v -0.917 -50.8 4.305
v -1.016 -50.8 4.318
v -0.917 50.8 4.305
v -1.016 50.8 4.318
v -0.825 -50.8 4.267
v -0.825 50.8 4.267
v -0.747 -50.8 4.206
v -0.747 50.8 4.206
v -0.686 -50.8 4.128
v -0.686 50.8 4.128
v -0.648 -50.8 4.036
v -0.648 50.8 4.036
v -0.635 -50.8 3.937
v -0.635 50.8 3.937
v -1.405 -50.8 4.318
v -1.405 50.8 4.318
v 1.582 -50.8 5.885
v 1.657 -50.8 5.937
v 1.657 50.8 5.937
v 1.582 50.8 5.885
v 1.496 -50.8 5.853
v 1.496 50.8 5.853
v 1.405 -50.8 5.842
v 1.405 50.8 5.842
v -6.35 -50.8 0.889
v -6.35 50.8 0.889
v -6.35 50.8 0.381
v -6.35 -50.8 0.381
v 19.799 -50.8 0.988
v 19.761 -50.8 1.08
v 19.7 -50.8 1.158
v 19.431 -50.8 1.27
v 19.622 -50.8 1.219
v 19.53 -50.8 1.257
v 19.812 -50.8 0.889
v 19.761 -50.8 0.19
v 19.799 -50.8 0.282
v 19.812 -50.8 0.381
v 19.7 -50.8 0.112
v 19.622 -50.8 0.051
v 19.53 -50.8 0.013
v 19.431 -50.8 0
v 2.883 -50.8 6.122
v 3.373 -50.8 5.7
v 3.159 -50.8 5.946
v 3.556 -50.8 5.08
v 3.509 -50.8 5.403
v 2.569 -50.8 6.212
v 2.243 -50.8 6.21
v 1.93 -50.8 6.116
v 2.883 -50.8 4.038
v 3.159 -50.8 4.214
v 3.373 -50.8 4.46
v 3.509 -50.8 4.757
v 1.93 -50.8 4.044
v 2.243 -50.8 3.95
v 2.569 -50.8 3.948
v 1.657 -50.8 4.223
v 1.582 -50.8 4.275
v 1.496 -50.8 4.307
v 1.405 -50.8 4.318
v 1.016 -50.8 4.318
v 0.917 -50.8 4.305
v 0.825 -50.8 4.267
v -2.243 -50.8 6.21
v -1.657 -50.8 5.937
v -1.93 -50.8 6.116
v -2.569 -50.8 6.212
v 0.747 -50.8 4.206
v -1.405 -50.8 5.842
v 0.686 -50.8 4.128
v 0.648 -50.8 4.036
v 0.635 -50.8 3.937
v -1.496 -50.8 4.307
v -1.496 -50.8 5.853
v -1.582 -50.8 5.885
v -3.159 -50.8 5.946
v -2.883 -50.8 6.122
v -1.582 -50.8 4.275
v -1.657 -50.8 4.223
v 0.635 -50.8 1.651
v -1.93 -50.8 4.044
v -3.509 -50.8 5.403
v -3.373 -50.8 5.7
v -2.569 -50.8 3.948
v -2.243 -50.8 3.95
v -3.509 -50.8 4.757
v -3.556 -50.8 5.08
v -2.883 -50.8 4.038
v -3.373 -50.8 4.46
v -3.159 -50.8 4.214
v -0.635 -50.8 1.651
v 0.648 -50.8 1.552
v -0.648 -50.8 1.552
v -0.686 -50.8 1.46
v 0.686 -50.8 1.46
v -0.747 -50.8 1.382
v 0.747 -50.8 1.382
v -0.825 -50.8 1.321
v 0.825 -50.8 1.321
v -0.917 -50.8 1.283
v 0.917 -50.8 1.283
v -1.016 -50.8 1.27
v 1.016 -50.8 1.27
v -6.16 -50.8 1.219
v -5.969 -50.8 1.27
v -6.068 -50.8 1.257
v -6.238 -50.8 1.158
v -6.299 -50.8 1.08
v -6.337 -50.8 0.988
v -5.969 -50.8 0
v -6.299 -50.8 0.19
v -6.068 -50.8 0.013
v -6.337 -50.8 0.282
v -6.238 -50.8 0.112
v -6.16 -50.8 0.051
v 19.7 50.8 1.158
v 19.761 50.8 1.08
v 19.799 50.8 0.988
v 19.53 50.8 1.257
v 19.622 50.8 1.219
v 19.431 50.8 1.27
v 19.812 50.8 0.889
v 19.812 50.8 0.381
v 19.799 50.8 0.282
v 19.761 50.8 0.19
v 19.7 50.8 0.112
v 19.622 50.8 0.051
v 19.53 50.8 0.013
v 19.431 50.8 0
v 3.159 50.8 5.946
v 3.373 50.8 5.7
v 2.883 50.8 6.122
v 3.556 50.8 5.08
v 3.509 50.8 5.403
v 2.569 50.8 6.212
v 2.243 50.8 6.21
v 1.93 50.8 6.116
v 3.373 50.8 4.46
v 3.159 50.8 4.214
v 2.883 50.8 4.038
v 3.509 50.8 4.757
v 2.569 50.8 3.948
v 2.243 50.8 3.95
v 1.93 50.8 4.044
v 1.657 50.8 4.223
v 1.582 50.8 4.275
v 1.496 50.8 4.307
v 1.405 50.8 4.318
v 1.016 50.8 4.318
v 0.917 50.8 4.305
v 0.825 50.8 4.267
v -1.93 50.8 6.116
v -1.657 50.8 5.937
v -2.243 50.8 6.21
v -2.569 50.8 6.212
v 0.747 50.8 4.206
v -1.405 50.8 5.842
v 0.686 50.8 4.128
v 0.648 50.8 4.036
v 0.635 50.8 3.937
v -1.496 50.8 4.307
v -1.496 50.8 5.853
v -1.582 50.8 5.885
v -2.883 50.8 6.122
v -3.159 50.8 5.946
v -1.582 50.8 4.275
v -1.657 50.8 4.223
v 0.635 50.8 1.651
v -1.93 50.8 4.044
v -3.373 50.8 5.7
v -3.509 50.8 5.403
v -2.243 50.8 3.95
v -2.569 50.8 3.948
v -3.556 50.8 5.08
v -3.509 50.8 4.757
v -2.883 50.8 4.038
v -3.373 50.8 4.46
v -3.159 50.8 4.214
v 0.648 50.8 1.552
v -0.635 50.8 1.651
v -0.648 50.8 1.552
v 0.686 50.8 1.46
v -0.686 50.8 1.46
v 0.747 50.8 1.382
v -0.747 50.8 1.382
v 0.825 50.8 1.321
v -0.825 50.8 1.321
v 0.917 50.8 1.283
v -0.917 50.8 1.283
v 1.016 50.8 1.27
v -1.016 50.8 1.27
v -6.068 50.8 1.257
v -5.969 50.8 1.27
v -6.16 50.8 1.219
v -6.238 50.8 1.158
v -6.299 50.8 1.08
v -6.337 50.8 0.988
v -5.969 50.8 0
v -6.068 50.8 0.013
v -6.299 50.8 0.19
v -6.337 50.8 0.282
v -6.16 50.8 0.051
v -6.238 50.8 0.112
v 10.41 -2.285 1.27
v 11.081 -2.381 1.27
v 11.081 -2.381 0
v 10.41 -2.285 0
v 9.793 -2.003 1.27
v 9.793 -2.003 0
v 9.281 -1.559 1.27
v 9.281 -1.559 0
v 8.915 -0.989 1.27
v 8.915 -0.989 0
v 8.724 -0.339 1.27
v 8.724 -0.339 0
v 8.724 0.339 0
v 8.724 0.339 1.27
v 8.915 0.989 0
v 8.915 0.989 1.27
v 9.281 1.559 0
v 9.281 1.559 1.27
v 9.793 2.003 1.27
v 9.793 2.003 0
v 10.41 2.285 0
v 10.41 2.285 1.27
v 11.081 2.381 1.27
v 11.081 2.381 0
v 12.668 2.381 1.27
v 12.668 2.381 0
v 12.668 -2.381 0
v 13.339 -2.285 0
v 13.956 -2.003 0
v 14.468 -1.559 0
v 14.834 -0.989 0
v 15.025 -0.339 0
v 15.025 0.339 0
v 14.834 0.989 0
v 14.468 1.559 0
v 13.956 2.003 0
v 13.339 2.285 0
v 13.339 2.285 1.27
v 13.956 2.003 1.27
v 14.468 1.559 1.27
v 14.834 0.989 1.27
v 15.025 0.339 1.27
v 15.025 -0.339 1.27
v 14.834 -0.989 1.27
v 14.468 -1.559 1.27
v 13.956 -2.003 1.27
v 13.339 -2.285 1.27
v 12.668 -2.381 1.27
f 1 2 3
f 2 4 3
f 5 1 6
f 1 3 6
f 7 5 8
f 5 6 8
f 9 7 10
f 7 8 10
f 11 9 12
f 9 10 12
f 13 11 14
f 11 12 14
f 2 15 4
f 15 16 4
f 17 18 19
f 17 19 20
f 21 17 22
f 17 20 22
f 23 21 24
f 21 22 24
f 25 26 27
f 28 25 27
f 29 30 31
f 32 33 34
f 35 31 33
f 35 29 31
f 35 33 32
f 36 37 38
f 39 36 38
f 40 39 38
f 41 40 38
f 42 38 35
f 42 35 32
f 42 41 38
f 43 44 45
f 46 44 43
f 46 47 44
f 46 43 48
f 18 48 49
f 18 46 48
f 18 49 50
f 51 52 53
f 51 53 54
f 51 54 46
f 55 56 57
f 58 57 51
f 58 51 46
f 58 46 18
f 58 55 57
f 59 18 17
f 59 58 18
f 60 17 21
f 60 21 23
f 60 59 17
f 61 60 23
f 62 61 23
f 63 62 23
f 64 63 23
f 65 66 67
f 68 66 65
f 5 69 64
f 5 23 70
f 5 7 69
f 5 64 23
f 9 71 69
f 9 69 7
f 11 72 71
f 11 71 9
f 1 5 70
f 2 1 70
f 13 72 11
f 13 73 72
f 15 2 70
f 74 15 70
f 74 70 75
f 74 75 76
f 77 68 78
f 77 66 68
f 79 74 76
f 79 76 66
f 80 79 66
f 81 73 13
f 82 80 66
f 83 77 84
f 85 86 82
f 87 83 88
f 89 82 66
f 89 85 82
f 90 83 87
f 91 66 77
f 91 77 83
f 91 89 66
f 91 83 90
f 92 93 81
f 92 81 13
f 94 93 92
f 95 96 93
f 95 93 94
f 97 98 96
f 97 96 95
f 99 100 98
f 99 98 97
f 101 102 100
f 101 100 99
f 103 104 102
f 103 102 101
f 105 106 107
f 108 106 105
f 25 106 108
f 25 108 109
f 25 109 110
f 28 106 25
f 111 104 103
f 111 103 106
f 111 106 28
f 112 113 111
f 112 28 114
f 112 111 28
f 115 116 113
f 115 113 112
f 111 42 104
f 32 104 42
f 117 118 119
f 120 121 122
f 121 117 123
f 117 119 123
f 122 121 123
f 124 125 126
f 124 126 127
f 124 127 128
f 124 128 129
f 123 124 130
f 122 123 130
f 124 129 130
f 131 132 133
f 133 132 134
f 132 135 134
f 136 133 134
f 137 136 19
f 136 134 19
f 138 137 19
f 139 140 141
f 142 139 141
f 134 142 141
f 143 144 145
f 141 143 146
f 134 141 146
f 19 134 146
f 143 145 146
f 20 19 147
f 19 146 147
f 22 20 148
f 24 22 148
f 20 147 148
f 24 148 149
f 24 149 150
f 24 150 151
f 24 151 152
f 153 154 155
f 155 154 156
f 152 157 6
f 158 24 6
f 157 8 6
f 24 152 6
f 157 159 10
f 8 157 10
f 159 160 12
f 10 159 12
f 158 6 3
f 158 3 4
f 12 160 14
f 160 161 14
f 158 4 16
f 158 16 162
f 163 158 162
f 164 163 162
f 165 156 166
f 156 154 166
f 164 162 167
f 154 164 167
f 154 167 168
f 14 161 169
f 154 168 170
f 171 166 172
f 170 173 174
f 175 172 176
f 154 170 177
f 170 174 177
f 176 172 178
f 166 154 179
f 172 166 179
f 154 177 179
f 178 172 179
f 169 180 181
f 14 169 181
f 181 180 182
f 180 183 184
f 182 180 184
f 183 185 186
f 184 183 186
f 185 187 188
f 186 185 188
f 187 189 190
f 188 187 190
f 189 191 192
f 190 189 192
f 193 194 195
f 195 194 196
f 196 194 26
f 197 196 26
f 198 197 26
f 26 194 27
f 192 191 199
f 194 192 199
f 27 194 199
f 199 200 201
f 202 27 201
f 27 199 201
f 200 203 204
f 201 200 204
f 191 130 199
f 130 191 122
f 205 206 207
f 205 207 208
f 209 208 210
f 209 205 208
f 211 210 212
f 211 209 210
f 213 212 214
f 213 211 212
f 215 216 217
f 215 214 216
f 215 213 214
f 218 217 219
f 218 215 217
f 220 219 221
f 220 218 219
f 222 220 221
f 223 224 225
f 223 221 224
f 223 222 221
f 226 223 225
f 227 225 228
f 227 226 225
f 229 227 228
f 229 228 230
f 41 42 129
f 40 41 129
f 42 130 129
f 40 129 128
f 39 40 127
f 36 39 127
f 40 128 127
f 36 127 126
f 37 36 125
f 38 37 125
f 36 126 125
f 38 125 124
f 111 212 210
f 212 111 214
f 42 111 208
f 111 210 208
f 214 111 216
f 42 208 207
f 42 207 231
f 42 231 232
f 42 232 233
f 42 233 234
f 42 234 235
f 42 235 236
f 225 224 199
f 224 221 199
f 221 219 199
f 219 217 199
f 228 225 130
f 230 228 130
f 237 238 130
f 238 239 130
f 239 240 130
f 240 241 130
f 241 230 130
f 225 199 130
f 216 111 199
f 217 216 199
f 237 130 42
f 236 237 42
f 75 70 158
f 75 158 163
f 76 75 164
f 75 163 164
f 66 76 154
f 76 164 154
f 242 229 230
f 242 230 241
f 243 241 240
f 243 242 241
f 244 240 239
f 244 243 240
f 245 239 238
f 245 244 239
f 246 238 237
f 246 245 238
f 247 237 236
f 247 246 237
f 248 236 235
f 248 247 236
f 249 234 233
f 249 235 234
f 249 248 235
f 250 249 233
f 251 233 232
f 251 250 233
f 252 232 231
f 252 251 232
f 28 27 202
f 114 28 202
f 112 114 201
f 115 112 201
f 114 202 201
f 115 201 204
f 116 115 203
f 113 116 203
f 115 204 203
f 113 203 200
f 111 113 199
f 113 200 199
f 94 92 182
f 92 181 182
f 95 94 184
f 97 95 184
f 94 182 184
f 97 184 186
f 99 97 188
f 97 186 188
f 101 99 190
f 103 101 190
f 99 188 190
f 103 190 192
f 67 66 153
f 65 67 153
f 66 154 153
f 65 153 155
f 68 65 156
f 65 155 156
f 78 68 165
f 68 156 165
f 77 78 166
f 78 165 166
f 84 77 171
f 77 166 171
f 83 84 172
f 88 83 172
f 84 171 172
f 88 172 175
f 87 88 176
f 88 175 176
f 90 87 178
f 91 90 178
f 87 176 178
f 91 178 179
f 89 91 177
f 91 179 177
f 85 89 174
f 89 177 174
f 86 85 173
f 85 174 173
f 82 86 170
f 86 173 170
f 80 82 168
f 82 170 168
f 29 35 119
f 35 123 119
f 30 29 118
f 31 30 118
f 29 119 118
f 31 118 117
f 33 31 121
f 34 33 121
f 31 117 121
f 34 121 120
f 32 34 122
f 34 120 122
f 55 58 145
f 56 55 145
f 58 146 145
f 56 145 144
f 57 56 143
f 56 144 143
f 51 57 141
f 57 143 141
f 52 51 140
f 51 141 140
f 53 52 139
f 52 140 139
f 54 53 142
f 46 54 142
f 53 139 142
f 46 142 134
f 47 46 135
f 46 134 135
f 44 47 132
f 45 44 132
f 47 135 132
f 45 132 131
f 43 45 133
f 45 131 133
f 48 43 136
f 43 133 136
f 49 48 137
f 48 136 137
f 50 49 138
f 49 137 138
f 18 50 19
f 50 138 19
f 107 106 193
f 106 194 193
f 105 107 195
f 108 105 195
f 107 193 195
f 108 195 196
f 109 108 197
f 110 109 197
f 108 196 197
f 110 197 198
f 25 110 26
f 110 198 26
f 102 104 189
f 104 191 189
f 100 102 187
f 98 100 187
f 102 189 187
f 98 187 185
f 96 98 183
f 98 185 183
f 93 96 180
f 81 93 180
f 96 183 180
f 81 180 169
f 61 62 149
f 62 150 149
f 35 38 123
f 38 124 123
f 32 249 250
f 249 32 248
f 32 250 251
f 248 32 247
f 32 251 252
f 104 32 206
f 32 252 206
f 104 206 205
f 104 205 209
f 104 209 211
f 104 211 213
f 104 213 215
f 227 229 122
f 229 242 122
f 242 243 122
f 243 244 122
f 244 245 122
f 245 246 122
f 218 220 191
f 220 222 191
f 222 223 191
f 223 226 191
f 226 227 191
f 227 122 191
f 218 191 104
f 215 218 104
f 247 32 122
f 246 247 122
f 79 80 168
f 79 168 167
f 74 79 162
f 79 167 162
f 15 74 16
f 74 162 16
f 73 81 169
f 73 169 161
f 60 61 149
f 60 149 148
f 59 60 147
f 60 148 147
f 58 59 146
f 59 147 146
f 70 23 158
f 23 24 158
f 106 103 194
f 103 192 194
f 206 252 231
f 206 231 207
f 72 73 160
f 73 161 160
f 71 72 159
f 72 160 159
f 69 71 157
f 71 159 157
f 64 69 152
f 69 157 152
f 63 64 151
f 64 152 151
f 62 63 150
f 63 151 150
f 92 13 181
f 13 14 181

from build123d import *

# Parameters (mm, degrees)
BOSS_EXTRUDE1_DEPTH = 50.8
CUT_EXTRUDE1_DEPTH  = 2.27


with BuildPart() as part:
    # Sketch2 → Boss-Extrude1 (new body, symmetric)
    with BuildSketch(Plane(origin=(0, 0, 0), x_dir=(1, 0, 0), z_dir=(0, 1, 0))):
        with BuildLine():
            Line((-5.969, 0), (19.431, 0))
            ThreePointArc((19.431, 0), (19.700407684, -0.111592316), (19.812, -0.381))
            Line((19.812, -0.381), (19.812, -0.889))
            ThreePointArc((19.812, -0.889), (19.700407684, -1.158407684), (19.431, -1.27))
            Line((19.431, -1.27), (1.016, -1.27))
            ThreePointArc((1.016, -1.27), (0.746592316, -1.381592316), (0.635, -1.651))
            Line((0.635, -1.651), (0.635, -3.937))
            ThreePointArc((0.635, -3.937), (0.746592316, -4.206407684), (1.016, -4.318))
            Line((1.016, -4.318), (1.40496875, -4.318))
            ThreePointArc((1.40496875, -4.318), (1.539672592, -4.293392866), (1.656976563, -4.22275))
            ThreePointArc((1.656976563, -4.22275), (3.556, -5.08), (1.656976563, -5.93725))
            ThreePointArc((1.656976563, -5.93725), (1.539672592, -5.866607134), (1.40496875, -5.842))
            Line((1.40496875, -5.842), (-1.40496875, -5.842))
            ThreePointArc((-1.40496875, -5.842), (-1.539672592, -5.866607134), (-1.656976563, -5.93725))
            ThreePointArc((-1.656976563, -5.93725), (-3.556, -5.08), (-1.656976563, -4.22275))
            ThreePointArc((-1.656976563, -4.22275), (-1.539672592, -4.293392866), (-1.40496875, -4.318))
            Line((-1.40496875, -4.318), (-1.016, -4.318))
            ThreePointArc((-1.016, -4.318), (-0.746592316, -4.206407684), (-0.635, -3.937))
            Line((-0.635, -3.937), (-0.635, -1.651))
            ThreePointArc((-0.635, -1.651), (-0.746592316, -1.381592316), (-1.016, -1.27))
            Line((-1.016, -1.27), (-5.969, -1.27))
            ThreePointArc((-5.969, -1.27), (-6.238407684, -1.158407684), (-6.35, -0.889))
            Line((-6.35, -0.889), (-6.35, -0.381))
            ThreePointArc((-6.35, -0.381), (-6.238407684, -0.111592316), (-5.969, 0))
        make_face()
    extrude(amount=BOSS_EXTRUDE1_DEPTH, both=True)

    # Sketch3 → Cut-Extrude1 (cut, through all)
    with BuildSketch(Plane.XY.offset(1.27)):
        with BuildLine():
            Line((11.08075, 2.38125), (12.66825, 2.38125))
            ThreePointArc((12.66825, 2.38125), (15.0495, 0), (12.66825, -2.38125))
            Line((12.66825, -2.38125), (11.08075, -2.38125))
            ThreePointArc((11.08075, -2.38125), (8.6995, 0), (11.08075, 2.38125))
        make_face()
    extrude(amount=-CUT_EXTRUDE1_DEPTH, mode=Mode.SUBTRACT)


solid = part.part
